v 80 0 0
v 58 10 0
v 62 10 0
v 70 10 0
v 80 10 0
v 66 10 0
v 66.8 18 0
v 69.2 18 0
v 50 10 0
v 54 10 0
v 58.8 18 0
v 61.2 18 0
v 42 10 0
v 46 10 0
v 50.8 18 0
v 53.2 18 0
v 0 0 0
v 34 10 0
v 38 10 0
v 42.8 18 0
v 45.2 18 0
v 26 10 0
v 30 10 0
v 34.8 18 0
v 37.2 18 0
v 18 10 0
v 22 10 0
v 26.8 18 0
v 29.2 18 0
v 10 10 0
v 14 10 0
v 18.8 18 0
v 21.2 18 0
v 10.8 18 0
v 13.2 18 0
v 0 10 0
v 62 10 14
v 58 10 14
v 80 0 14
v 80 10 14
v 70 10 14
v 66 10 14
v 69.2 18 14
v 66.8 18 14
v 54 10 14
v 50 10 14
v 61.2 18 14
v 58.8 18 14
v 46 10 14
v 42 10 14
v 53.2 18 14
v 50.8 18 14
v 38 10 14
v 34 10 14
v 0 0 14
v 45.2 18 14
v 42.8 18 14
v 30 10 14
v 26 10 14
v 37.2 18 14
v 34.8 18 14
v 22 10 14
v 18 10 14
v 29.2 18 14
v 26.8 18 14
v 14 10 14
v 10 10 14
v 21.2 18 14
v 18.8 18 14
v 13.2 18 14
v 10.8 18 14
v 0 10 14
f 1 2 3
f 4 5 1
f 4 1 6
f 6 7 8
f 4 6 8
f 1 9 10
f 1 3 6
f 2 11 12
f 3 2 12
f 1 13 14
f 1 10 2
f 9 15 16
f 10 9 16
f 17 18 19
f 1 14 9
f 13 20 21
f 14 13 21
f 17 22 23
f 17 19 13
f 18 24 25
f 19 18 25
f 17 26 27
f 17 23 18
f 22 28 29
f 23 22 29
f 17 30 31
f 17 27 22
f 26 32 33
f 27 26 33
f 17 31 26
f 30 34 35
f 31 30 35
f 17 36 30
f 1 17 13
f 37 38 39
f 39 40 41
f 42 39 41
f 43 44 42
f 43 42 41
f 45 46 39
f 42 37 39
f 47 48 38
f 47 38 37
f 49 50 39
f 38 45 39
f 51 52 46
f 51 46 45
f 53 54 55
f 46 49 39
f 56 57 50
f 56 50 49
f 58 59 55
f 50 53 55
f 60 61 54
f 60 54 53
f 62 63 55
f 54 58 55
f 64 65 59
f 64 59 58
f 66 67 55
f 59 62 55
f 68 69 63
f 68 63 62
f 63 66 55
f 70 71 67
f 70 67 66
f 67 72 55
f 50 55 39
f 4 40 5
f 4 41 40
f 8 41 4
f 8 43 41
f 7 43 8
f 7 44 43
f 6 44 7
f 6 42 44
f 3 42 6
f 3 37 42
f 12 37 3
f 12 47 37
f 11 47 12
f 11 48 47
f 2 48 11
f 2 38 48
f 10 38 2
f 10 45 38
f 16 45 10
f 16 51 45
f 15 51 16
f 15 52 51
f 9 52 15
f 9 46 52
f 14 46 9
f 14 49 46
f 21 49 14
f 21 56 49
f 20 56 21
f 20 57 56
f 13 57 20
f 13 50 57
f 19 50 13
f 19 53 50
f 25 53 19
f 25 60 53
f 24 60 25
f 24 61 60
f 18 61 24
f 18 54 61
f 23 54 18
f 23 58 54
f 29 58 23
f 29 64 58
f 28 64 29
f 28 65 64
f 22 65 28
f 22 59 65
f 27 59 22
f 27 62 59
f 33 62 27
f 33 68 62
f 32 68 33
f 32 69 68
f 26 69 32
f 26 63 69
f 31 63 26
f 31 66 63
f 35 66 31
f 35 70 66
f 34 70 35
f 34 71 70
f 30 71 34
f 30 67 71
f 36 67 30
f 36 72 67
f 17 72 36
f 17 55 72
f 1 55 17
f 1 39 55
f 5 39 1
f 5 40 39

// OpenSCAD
$fn = 32;

// ----------------------------------------------------------------------
// Gear rack: 8 teeth on a 80 mm bar, pitch 8 mm
// ----------------------------------------------------------------------

// --- parameters (mm) ---
profile_height = 14;      // extrusion height
profile_points = 36;      // points of the closed outline

profile = [[0, 0], [80, 0], [80, 10], [70, 10], [69.2, 18], [66.8, 18], [66, 10], [62, 10], [61.2, 18], [58.8, 18], [58, 10], [54, 10], [53.2, 18], [50.8, 18], [50, 10], [46, 10], [45.2, 18], [42.8, 18], [42, 10], [38, 10], [37.2, 18], [34.8, 18], [34, 10], [30, 10], [29.2, 18], [26.8, 18], [26, 10], [22, 10], [21.2, 18], [18.8, 18], [18, 10], [14, 10], [13.2, 18], [10.8, 18], [10, 10], [0, 10]];  // single closed polygon, 36 points, counter clockwise

// --- the one profile operation ---
linear_extrude(height = profile_height) polygon(points = profile);
